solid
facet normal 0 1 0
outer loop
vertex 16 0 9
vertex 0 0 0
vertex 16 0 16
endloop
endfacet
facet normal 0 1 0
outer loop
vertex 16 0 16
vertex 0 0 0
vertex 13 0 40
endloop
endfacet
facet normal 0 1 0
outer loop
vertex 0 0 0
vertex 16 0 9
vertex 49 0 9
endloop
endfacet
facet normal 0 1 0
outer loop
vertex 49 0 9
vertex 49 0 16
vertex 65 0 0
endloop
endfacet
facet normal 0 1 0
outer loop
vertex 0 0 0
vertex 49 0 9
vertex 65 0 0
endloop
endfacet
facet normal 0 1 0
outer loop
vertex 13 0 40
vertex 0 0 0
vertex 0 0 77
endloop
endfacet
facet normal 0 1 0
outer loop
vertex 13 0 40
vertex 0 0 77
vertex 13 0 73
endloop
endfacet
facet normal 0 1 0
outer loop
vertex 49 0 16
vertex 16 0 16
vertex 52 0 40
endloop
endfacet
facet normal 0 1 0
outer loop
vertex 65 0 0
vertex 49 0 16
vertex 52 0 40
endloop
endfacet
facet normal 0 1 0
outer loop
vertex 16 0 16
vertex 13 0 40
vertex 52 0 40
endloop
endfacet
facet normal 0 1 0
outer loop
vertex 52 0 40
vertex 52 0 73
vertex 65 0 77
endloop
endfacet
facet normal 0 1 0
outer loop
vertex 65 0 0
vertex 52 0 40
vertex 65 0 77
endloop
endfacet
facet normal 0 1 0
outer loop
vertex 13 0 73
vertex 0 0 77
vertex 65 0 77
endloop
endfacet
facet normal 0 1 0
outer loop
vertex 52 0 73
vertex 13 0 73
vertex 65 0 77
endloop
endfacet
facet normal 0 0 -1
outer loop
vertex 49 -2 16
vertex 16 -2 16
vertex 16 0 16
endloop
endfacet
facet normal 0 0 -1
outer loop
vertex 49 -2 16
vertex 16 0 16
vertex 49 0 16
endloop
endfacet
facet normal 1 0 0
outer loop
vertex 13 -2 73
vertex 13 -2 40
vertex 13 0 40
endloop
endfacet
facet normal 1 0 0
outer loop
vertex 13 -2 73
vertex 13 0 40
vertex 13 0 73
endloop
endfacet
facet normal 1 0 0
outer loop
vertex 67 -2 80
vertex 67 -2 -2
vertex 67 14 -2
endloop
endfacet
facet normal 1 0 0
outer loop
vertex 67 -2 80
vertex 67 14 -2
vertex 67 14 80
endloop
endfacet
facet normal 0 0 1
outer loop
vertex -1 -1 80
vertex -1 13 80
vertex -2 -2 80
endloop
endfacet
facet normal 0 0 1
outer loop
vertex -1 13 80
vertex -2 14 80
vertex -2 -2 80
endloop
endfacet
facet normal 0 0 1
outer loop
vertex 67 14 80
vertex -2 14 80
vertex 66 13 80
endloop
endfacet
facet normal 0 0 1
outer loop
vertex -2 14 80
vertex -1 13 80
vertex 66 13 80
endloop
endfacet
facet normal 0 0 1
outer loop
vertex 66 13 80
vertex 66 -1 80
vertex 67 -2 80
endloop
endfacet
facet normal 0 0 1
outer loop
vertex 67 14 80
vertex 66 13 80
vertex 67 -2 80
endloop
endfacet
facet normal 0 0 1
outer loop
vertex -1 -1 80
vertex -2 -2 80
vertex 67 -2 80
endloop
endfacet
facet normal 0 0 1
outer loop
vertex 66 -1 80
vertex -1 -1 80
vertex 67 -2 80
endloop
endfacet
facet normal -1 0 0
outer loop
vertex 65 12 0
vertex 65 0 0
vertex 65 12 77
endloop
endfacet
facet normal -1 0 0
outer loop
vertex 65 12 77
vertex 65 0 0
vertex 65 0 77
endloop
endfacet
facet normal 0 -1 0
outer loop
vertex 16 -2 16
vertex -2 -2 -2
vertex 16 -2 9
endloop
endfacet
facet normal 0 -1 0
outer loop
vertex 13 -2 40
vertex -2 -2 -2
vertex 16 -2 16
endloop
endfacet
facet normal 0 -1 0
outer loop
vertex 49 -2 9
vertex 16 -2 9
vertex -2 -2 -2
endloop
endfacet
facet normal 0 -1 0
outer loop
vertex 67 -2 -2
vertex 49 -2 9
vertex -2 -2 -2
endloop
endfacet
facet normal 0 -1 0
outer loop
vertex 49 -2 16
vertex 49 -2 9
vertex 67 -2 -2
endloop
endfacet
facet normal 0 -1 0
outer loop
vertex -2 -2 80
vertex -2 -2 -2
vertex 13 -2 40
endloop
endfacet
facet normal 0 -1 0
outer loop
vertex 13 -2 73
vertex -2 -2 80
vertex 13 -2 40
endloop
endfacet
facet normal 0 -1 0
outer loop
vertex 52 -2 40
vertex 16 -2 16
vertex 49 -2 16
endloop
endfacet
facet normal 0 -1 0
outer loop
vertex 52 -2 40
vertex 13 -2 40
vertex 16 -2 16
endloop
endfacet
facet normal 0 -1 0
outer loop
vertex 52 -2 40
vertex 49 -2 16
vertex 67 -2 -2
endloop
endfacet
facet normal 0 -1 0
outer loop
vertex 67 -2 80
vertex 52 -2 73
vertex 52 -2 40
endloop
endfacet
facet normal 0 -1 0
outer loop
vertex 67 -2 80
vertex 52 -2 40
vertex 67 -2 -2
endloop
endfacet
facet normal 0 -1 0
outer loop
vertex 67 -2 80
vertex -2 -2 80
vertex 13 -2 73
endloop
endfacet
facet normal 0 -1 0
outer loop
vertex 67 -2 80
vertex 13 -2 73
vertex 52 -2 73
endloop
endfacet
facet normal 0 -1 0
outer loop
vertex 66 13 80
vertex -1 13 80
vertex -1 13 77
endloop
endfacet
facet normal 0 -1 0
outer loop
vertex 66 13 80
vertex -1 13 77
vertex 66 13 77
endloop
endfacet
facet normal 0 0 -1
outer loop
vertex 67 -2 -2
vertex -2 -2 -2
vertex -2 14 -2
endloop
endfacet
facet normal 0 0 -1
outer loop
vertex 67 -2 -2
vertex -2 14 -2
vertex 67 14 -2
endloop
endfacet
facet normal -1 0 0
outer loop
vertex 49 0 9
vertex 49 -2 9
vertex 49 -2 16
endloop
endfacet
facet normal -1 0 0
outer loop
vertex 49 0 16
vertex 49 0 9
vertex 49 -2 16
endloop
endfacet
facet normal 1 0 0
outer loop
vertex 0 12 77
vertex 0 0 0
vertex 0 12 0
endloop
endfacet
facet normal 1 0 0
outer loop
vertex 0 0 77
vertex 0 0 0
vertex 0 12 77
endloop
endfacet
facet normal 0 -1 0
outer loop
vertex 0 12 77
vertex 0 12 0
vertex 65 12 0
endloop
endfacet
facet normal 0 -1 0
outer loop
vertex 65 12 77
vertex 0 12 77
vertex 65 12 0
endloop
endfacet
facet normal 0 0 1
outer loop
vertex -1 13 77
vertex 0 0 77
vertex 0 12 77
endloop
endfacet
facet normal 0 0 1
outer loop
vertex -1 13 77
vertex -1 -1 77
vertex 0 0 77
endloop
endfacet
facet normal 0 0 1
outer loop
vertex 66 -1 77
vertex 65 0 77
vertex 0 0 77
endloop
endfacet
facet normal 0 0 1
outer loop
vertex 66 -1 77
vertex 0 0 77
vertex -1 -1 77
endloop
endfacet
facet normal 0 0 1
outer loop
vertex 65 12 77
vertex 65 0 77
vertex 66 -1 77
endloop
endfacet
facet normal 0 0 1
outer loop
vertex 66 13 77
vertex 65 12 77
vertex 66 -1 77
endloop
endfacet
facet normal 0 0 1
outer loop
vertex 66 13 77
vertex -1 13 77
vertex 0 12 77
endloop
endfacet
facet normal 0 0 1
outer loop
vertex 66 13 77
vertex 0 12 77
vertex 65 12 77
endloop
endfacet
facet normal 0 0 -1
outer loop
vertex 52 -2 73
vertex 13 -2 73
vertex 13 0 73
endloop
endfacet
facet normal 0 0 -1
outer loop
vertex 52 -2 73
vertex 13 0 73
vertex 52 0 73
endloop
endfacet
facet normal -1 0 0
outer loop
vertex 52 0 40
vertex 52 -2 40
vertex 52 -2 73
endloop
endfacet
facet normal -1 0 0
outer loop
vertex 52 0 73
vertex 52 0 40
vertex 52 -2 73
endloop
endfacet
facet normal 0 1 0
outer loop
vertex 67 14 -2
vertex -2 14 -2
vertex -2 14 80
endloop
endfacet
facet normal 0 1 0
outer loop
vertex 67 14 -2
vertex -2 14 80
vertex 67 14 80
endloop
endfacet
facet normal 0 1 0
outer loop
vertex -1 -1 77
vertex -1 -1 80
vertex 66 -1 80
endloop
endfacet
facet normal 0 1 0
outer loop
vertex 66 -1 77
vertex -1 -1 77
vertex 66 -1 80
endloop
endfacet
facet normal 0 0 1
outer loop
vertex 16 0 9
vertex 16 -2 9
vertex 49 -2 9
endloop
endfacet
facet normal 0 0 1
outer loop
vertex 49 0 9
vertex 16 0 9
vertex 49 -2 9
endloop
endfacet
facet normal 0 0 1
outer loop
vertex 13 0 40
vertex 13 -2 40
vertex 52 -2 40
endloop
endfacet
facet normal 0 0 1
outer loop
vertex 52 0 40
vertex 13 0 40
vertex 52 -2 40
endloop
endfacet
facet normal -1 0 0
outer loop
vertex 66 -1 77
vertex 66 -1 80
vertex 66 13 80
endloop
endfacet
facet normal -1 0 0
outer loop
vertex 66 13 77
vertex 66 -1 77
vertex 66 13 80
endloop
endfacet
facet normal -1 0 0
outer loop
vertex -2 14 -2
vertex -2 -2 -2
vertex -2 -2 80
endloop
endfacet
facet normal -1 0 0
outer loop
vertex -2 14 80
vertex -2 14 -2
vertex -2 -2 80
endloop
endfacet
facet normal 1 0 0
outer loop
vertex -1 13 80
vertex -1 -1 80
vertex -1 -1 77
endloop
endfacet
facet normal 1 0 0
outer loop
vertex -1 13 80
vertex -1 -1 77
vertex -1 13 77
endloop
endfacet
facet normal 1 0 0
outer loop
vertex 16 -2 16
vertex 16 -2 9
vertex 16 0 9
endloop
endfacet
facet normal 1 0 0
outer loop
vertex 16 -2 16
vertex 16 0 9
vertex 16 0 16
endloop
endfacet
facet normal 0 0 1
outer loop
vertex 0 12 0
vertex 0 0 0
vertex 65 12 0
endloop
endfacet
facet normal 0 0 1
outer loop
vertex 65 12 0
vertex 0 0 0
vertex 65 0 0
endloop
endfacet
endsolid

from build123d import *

# Parameters (mm, degrees)
F0_W     = 65
F0_H     = 80
F1_DEPTH = 12
F2_T     = 2
F3_W     = 67
F3_H     = 14
F4_DEPTH = 3
F5_W     = 33
F5_H     = 7
F5_W_2   = 39
F5_H_2   = 33
F6_DEPTH = 2


with BuildPart() as f1:
    # F0 (on Front) → F1 (new body)
    with BuildSketch(Plane.XZ):
        with Locations((32.5, 40)):
            Rectangle(F0_W, F0_H)
    extrude(amount=-F1_DEPTH)

    # F2
    f2_openings = [f1.faces().sort_by_distance(p)[0] for p in [
        (32.5, 6, 80),
    ]]
    offset(amount=F2_T, openings=f2_openings, kind=Kind.INTERSECTION)

    # F3 (on face) → F4 (cut)
    with BuildSketch(Plane.XY.offset(80)):
        with Locations((32.5, 6)):
            Rectangle(F3_W, F3_H)
    extrude(amount=-F4_DEPTH, mode=Mode.SUBTRACT)

    # F5 (on face) → F6 (cut, through all)
    with BuildSketch(Plane.XZ.offset(2)):
        with Locations((32.5, 12.5)):
            Rectangle(F5_W, F5_H)
        with Locations((32.5, 56.5)):
            Rectangle(F5_W_2, F5_H_2)
    extrude(amount=-F6_DEPTH, mode=Mode.SUBTRACT)


solid = f1.part
